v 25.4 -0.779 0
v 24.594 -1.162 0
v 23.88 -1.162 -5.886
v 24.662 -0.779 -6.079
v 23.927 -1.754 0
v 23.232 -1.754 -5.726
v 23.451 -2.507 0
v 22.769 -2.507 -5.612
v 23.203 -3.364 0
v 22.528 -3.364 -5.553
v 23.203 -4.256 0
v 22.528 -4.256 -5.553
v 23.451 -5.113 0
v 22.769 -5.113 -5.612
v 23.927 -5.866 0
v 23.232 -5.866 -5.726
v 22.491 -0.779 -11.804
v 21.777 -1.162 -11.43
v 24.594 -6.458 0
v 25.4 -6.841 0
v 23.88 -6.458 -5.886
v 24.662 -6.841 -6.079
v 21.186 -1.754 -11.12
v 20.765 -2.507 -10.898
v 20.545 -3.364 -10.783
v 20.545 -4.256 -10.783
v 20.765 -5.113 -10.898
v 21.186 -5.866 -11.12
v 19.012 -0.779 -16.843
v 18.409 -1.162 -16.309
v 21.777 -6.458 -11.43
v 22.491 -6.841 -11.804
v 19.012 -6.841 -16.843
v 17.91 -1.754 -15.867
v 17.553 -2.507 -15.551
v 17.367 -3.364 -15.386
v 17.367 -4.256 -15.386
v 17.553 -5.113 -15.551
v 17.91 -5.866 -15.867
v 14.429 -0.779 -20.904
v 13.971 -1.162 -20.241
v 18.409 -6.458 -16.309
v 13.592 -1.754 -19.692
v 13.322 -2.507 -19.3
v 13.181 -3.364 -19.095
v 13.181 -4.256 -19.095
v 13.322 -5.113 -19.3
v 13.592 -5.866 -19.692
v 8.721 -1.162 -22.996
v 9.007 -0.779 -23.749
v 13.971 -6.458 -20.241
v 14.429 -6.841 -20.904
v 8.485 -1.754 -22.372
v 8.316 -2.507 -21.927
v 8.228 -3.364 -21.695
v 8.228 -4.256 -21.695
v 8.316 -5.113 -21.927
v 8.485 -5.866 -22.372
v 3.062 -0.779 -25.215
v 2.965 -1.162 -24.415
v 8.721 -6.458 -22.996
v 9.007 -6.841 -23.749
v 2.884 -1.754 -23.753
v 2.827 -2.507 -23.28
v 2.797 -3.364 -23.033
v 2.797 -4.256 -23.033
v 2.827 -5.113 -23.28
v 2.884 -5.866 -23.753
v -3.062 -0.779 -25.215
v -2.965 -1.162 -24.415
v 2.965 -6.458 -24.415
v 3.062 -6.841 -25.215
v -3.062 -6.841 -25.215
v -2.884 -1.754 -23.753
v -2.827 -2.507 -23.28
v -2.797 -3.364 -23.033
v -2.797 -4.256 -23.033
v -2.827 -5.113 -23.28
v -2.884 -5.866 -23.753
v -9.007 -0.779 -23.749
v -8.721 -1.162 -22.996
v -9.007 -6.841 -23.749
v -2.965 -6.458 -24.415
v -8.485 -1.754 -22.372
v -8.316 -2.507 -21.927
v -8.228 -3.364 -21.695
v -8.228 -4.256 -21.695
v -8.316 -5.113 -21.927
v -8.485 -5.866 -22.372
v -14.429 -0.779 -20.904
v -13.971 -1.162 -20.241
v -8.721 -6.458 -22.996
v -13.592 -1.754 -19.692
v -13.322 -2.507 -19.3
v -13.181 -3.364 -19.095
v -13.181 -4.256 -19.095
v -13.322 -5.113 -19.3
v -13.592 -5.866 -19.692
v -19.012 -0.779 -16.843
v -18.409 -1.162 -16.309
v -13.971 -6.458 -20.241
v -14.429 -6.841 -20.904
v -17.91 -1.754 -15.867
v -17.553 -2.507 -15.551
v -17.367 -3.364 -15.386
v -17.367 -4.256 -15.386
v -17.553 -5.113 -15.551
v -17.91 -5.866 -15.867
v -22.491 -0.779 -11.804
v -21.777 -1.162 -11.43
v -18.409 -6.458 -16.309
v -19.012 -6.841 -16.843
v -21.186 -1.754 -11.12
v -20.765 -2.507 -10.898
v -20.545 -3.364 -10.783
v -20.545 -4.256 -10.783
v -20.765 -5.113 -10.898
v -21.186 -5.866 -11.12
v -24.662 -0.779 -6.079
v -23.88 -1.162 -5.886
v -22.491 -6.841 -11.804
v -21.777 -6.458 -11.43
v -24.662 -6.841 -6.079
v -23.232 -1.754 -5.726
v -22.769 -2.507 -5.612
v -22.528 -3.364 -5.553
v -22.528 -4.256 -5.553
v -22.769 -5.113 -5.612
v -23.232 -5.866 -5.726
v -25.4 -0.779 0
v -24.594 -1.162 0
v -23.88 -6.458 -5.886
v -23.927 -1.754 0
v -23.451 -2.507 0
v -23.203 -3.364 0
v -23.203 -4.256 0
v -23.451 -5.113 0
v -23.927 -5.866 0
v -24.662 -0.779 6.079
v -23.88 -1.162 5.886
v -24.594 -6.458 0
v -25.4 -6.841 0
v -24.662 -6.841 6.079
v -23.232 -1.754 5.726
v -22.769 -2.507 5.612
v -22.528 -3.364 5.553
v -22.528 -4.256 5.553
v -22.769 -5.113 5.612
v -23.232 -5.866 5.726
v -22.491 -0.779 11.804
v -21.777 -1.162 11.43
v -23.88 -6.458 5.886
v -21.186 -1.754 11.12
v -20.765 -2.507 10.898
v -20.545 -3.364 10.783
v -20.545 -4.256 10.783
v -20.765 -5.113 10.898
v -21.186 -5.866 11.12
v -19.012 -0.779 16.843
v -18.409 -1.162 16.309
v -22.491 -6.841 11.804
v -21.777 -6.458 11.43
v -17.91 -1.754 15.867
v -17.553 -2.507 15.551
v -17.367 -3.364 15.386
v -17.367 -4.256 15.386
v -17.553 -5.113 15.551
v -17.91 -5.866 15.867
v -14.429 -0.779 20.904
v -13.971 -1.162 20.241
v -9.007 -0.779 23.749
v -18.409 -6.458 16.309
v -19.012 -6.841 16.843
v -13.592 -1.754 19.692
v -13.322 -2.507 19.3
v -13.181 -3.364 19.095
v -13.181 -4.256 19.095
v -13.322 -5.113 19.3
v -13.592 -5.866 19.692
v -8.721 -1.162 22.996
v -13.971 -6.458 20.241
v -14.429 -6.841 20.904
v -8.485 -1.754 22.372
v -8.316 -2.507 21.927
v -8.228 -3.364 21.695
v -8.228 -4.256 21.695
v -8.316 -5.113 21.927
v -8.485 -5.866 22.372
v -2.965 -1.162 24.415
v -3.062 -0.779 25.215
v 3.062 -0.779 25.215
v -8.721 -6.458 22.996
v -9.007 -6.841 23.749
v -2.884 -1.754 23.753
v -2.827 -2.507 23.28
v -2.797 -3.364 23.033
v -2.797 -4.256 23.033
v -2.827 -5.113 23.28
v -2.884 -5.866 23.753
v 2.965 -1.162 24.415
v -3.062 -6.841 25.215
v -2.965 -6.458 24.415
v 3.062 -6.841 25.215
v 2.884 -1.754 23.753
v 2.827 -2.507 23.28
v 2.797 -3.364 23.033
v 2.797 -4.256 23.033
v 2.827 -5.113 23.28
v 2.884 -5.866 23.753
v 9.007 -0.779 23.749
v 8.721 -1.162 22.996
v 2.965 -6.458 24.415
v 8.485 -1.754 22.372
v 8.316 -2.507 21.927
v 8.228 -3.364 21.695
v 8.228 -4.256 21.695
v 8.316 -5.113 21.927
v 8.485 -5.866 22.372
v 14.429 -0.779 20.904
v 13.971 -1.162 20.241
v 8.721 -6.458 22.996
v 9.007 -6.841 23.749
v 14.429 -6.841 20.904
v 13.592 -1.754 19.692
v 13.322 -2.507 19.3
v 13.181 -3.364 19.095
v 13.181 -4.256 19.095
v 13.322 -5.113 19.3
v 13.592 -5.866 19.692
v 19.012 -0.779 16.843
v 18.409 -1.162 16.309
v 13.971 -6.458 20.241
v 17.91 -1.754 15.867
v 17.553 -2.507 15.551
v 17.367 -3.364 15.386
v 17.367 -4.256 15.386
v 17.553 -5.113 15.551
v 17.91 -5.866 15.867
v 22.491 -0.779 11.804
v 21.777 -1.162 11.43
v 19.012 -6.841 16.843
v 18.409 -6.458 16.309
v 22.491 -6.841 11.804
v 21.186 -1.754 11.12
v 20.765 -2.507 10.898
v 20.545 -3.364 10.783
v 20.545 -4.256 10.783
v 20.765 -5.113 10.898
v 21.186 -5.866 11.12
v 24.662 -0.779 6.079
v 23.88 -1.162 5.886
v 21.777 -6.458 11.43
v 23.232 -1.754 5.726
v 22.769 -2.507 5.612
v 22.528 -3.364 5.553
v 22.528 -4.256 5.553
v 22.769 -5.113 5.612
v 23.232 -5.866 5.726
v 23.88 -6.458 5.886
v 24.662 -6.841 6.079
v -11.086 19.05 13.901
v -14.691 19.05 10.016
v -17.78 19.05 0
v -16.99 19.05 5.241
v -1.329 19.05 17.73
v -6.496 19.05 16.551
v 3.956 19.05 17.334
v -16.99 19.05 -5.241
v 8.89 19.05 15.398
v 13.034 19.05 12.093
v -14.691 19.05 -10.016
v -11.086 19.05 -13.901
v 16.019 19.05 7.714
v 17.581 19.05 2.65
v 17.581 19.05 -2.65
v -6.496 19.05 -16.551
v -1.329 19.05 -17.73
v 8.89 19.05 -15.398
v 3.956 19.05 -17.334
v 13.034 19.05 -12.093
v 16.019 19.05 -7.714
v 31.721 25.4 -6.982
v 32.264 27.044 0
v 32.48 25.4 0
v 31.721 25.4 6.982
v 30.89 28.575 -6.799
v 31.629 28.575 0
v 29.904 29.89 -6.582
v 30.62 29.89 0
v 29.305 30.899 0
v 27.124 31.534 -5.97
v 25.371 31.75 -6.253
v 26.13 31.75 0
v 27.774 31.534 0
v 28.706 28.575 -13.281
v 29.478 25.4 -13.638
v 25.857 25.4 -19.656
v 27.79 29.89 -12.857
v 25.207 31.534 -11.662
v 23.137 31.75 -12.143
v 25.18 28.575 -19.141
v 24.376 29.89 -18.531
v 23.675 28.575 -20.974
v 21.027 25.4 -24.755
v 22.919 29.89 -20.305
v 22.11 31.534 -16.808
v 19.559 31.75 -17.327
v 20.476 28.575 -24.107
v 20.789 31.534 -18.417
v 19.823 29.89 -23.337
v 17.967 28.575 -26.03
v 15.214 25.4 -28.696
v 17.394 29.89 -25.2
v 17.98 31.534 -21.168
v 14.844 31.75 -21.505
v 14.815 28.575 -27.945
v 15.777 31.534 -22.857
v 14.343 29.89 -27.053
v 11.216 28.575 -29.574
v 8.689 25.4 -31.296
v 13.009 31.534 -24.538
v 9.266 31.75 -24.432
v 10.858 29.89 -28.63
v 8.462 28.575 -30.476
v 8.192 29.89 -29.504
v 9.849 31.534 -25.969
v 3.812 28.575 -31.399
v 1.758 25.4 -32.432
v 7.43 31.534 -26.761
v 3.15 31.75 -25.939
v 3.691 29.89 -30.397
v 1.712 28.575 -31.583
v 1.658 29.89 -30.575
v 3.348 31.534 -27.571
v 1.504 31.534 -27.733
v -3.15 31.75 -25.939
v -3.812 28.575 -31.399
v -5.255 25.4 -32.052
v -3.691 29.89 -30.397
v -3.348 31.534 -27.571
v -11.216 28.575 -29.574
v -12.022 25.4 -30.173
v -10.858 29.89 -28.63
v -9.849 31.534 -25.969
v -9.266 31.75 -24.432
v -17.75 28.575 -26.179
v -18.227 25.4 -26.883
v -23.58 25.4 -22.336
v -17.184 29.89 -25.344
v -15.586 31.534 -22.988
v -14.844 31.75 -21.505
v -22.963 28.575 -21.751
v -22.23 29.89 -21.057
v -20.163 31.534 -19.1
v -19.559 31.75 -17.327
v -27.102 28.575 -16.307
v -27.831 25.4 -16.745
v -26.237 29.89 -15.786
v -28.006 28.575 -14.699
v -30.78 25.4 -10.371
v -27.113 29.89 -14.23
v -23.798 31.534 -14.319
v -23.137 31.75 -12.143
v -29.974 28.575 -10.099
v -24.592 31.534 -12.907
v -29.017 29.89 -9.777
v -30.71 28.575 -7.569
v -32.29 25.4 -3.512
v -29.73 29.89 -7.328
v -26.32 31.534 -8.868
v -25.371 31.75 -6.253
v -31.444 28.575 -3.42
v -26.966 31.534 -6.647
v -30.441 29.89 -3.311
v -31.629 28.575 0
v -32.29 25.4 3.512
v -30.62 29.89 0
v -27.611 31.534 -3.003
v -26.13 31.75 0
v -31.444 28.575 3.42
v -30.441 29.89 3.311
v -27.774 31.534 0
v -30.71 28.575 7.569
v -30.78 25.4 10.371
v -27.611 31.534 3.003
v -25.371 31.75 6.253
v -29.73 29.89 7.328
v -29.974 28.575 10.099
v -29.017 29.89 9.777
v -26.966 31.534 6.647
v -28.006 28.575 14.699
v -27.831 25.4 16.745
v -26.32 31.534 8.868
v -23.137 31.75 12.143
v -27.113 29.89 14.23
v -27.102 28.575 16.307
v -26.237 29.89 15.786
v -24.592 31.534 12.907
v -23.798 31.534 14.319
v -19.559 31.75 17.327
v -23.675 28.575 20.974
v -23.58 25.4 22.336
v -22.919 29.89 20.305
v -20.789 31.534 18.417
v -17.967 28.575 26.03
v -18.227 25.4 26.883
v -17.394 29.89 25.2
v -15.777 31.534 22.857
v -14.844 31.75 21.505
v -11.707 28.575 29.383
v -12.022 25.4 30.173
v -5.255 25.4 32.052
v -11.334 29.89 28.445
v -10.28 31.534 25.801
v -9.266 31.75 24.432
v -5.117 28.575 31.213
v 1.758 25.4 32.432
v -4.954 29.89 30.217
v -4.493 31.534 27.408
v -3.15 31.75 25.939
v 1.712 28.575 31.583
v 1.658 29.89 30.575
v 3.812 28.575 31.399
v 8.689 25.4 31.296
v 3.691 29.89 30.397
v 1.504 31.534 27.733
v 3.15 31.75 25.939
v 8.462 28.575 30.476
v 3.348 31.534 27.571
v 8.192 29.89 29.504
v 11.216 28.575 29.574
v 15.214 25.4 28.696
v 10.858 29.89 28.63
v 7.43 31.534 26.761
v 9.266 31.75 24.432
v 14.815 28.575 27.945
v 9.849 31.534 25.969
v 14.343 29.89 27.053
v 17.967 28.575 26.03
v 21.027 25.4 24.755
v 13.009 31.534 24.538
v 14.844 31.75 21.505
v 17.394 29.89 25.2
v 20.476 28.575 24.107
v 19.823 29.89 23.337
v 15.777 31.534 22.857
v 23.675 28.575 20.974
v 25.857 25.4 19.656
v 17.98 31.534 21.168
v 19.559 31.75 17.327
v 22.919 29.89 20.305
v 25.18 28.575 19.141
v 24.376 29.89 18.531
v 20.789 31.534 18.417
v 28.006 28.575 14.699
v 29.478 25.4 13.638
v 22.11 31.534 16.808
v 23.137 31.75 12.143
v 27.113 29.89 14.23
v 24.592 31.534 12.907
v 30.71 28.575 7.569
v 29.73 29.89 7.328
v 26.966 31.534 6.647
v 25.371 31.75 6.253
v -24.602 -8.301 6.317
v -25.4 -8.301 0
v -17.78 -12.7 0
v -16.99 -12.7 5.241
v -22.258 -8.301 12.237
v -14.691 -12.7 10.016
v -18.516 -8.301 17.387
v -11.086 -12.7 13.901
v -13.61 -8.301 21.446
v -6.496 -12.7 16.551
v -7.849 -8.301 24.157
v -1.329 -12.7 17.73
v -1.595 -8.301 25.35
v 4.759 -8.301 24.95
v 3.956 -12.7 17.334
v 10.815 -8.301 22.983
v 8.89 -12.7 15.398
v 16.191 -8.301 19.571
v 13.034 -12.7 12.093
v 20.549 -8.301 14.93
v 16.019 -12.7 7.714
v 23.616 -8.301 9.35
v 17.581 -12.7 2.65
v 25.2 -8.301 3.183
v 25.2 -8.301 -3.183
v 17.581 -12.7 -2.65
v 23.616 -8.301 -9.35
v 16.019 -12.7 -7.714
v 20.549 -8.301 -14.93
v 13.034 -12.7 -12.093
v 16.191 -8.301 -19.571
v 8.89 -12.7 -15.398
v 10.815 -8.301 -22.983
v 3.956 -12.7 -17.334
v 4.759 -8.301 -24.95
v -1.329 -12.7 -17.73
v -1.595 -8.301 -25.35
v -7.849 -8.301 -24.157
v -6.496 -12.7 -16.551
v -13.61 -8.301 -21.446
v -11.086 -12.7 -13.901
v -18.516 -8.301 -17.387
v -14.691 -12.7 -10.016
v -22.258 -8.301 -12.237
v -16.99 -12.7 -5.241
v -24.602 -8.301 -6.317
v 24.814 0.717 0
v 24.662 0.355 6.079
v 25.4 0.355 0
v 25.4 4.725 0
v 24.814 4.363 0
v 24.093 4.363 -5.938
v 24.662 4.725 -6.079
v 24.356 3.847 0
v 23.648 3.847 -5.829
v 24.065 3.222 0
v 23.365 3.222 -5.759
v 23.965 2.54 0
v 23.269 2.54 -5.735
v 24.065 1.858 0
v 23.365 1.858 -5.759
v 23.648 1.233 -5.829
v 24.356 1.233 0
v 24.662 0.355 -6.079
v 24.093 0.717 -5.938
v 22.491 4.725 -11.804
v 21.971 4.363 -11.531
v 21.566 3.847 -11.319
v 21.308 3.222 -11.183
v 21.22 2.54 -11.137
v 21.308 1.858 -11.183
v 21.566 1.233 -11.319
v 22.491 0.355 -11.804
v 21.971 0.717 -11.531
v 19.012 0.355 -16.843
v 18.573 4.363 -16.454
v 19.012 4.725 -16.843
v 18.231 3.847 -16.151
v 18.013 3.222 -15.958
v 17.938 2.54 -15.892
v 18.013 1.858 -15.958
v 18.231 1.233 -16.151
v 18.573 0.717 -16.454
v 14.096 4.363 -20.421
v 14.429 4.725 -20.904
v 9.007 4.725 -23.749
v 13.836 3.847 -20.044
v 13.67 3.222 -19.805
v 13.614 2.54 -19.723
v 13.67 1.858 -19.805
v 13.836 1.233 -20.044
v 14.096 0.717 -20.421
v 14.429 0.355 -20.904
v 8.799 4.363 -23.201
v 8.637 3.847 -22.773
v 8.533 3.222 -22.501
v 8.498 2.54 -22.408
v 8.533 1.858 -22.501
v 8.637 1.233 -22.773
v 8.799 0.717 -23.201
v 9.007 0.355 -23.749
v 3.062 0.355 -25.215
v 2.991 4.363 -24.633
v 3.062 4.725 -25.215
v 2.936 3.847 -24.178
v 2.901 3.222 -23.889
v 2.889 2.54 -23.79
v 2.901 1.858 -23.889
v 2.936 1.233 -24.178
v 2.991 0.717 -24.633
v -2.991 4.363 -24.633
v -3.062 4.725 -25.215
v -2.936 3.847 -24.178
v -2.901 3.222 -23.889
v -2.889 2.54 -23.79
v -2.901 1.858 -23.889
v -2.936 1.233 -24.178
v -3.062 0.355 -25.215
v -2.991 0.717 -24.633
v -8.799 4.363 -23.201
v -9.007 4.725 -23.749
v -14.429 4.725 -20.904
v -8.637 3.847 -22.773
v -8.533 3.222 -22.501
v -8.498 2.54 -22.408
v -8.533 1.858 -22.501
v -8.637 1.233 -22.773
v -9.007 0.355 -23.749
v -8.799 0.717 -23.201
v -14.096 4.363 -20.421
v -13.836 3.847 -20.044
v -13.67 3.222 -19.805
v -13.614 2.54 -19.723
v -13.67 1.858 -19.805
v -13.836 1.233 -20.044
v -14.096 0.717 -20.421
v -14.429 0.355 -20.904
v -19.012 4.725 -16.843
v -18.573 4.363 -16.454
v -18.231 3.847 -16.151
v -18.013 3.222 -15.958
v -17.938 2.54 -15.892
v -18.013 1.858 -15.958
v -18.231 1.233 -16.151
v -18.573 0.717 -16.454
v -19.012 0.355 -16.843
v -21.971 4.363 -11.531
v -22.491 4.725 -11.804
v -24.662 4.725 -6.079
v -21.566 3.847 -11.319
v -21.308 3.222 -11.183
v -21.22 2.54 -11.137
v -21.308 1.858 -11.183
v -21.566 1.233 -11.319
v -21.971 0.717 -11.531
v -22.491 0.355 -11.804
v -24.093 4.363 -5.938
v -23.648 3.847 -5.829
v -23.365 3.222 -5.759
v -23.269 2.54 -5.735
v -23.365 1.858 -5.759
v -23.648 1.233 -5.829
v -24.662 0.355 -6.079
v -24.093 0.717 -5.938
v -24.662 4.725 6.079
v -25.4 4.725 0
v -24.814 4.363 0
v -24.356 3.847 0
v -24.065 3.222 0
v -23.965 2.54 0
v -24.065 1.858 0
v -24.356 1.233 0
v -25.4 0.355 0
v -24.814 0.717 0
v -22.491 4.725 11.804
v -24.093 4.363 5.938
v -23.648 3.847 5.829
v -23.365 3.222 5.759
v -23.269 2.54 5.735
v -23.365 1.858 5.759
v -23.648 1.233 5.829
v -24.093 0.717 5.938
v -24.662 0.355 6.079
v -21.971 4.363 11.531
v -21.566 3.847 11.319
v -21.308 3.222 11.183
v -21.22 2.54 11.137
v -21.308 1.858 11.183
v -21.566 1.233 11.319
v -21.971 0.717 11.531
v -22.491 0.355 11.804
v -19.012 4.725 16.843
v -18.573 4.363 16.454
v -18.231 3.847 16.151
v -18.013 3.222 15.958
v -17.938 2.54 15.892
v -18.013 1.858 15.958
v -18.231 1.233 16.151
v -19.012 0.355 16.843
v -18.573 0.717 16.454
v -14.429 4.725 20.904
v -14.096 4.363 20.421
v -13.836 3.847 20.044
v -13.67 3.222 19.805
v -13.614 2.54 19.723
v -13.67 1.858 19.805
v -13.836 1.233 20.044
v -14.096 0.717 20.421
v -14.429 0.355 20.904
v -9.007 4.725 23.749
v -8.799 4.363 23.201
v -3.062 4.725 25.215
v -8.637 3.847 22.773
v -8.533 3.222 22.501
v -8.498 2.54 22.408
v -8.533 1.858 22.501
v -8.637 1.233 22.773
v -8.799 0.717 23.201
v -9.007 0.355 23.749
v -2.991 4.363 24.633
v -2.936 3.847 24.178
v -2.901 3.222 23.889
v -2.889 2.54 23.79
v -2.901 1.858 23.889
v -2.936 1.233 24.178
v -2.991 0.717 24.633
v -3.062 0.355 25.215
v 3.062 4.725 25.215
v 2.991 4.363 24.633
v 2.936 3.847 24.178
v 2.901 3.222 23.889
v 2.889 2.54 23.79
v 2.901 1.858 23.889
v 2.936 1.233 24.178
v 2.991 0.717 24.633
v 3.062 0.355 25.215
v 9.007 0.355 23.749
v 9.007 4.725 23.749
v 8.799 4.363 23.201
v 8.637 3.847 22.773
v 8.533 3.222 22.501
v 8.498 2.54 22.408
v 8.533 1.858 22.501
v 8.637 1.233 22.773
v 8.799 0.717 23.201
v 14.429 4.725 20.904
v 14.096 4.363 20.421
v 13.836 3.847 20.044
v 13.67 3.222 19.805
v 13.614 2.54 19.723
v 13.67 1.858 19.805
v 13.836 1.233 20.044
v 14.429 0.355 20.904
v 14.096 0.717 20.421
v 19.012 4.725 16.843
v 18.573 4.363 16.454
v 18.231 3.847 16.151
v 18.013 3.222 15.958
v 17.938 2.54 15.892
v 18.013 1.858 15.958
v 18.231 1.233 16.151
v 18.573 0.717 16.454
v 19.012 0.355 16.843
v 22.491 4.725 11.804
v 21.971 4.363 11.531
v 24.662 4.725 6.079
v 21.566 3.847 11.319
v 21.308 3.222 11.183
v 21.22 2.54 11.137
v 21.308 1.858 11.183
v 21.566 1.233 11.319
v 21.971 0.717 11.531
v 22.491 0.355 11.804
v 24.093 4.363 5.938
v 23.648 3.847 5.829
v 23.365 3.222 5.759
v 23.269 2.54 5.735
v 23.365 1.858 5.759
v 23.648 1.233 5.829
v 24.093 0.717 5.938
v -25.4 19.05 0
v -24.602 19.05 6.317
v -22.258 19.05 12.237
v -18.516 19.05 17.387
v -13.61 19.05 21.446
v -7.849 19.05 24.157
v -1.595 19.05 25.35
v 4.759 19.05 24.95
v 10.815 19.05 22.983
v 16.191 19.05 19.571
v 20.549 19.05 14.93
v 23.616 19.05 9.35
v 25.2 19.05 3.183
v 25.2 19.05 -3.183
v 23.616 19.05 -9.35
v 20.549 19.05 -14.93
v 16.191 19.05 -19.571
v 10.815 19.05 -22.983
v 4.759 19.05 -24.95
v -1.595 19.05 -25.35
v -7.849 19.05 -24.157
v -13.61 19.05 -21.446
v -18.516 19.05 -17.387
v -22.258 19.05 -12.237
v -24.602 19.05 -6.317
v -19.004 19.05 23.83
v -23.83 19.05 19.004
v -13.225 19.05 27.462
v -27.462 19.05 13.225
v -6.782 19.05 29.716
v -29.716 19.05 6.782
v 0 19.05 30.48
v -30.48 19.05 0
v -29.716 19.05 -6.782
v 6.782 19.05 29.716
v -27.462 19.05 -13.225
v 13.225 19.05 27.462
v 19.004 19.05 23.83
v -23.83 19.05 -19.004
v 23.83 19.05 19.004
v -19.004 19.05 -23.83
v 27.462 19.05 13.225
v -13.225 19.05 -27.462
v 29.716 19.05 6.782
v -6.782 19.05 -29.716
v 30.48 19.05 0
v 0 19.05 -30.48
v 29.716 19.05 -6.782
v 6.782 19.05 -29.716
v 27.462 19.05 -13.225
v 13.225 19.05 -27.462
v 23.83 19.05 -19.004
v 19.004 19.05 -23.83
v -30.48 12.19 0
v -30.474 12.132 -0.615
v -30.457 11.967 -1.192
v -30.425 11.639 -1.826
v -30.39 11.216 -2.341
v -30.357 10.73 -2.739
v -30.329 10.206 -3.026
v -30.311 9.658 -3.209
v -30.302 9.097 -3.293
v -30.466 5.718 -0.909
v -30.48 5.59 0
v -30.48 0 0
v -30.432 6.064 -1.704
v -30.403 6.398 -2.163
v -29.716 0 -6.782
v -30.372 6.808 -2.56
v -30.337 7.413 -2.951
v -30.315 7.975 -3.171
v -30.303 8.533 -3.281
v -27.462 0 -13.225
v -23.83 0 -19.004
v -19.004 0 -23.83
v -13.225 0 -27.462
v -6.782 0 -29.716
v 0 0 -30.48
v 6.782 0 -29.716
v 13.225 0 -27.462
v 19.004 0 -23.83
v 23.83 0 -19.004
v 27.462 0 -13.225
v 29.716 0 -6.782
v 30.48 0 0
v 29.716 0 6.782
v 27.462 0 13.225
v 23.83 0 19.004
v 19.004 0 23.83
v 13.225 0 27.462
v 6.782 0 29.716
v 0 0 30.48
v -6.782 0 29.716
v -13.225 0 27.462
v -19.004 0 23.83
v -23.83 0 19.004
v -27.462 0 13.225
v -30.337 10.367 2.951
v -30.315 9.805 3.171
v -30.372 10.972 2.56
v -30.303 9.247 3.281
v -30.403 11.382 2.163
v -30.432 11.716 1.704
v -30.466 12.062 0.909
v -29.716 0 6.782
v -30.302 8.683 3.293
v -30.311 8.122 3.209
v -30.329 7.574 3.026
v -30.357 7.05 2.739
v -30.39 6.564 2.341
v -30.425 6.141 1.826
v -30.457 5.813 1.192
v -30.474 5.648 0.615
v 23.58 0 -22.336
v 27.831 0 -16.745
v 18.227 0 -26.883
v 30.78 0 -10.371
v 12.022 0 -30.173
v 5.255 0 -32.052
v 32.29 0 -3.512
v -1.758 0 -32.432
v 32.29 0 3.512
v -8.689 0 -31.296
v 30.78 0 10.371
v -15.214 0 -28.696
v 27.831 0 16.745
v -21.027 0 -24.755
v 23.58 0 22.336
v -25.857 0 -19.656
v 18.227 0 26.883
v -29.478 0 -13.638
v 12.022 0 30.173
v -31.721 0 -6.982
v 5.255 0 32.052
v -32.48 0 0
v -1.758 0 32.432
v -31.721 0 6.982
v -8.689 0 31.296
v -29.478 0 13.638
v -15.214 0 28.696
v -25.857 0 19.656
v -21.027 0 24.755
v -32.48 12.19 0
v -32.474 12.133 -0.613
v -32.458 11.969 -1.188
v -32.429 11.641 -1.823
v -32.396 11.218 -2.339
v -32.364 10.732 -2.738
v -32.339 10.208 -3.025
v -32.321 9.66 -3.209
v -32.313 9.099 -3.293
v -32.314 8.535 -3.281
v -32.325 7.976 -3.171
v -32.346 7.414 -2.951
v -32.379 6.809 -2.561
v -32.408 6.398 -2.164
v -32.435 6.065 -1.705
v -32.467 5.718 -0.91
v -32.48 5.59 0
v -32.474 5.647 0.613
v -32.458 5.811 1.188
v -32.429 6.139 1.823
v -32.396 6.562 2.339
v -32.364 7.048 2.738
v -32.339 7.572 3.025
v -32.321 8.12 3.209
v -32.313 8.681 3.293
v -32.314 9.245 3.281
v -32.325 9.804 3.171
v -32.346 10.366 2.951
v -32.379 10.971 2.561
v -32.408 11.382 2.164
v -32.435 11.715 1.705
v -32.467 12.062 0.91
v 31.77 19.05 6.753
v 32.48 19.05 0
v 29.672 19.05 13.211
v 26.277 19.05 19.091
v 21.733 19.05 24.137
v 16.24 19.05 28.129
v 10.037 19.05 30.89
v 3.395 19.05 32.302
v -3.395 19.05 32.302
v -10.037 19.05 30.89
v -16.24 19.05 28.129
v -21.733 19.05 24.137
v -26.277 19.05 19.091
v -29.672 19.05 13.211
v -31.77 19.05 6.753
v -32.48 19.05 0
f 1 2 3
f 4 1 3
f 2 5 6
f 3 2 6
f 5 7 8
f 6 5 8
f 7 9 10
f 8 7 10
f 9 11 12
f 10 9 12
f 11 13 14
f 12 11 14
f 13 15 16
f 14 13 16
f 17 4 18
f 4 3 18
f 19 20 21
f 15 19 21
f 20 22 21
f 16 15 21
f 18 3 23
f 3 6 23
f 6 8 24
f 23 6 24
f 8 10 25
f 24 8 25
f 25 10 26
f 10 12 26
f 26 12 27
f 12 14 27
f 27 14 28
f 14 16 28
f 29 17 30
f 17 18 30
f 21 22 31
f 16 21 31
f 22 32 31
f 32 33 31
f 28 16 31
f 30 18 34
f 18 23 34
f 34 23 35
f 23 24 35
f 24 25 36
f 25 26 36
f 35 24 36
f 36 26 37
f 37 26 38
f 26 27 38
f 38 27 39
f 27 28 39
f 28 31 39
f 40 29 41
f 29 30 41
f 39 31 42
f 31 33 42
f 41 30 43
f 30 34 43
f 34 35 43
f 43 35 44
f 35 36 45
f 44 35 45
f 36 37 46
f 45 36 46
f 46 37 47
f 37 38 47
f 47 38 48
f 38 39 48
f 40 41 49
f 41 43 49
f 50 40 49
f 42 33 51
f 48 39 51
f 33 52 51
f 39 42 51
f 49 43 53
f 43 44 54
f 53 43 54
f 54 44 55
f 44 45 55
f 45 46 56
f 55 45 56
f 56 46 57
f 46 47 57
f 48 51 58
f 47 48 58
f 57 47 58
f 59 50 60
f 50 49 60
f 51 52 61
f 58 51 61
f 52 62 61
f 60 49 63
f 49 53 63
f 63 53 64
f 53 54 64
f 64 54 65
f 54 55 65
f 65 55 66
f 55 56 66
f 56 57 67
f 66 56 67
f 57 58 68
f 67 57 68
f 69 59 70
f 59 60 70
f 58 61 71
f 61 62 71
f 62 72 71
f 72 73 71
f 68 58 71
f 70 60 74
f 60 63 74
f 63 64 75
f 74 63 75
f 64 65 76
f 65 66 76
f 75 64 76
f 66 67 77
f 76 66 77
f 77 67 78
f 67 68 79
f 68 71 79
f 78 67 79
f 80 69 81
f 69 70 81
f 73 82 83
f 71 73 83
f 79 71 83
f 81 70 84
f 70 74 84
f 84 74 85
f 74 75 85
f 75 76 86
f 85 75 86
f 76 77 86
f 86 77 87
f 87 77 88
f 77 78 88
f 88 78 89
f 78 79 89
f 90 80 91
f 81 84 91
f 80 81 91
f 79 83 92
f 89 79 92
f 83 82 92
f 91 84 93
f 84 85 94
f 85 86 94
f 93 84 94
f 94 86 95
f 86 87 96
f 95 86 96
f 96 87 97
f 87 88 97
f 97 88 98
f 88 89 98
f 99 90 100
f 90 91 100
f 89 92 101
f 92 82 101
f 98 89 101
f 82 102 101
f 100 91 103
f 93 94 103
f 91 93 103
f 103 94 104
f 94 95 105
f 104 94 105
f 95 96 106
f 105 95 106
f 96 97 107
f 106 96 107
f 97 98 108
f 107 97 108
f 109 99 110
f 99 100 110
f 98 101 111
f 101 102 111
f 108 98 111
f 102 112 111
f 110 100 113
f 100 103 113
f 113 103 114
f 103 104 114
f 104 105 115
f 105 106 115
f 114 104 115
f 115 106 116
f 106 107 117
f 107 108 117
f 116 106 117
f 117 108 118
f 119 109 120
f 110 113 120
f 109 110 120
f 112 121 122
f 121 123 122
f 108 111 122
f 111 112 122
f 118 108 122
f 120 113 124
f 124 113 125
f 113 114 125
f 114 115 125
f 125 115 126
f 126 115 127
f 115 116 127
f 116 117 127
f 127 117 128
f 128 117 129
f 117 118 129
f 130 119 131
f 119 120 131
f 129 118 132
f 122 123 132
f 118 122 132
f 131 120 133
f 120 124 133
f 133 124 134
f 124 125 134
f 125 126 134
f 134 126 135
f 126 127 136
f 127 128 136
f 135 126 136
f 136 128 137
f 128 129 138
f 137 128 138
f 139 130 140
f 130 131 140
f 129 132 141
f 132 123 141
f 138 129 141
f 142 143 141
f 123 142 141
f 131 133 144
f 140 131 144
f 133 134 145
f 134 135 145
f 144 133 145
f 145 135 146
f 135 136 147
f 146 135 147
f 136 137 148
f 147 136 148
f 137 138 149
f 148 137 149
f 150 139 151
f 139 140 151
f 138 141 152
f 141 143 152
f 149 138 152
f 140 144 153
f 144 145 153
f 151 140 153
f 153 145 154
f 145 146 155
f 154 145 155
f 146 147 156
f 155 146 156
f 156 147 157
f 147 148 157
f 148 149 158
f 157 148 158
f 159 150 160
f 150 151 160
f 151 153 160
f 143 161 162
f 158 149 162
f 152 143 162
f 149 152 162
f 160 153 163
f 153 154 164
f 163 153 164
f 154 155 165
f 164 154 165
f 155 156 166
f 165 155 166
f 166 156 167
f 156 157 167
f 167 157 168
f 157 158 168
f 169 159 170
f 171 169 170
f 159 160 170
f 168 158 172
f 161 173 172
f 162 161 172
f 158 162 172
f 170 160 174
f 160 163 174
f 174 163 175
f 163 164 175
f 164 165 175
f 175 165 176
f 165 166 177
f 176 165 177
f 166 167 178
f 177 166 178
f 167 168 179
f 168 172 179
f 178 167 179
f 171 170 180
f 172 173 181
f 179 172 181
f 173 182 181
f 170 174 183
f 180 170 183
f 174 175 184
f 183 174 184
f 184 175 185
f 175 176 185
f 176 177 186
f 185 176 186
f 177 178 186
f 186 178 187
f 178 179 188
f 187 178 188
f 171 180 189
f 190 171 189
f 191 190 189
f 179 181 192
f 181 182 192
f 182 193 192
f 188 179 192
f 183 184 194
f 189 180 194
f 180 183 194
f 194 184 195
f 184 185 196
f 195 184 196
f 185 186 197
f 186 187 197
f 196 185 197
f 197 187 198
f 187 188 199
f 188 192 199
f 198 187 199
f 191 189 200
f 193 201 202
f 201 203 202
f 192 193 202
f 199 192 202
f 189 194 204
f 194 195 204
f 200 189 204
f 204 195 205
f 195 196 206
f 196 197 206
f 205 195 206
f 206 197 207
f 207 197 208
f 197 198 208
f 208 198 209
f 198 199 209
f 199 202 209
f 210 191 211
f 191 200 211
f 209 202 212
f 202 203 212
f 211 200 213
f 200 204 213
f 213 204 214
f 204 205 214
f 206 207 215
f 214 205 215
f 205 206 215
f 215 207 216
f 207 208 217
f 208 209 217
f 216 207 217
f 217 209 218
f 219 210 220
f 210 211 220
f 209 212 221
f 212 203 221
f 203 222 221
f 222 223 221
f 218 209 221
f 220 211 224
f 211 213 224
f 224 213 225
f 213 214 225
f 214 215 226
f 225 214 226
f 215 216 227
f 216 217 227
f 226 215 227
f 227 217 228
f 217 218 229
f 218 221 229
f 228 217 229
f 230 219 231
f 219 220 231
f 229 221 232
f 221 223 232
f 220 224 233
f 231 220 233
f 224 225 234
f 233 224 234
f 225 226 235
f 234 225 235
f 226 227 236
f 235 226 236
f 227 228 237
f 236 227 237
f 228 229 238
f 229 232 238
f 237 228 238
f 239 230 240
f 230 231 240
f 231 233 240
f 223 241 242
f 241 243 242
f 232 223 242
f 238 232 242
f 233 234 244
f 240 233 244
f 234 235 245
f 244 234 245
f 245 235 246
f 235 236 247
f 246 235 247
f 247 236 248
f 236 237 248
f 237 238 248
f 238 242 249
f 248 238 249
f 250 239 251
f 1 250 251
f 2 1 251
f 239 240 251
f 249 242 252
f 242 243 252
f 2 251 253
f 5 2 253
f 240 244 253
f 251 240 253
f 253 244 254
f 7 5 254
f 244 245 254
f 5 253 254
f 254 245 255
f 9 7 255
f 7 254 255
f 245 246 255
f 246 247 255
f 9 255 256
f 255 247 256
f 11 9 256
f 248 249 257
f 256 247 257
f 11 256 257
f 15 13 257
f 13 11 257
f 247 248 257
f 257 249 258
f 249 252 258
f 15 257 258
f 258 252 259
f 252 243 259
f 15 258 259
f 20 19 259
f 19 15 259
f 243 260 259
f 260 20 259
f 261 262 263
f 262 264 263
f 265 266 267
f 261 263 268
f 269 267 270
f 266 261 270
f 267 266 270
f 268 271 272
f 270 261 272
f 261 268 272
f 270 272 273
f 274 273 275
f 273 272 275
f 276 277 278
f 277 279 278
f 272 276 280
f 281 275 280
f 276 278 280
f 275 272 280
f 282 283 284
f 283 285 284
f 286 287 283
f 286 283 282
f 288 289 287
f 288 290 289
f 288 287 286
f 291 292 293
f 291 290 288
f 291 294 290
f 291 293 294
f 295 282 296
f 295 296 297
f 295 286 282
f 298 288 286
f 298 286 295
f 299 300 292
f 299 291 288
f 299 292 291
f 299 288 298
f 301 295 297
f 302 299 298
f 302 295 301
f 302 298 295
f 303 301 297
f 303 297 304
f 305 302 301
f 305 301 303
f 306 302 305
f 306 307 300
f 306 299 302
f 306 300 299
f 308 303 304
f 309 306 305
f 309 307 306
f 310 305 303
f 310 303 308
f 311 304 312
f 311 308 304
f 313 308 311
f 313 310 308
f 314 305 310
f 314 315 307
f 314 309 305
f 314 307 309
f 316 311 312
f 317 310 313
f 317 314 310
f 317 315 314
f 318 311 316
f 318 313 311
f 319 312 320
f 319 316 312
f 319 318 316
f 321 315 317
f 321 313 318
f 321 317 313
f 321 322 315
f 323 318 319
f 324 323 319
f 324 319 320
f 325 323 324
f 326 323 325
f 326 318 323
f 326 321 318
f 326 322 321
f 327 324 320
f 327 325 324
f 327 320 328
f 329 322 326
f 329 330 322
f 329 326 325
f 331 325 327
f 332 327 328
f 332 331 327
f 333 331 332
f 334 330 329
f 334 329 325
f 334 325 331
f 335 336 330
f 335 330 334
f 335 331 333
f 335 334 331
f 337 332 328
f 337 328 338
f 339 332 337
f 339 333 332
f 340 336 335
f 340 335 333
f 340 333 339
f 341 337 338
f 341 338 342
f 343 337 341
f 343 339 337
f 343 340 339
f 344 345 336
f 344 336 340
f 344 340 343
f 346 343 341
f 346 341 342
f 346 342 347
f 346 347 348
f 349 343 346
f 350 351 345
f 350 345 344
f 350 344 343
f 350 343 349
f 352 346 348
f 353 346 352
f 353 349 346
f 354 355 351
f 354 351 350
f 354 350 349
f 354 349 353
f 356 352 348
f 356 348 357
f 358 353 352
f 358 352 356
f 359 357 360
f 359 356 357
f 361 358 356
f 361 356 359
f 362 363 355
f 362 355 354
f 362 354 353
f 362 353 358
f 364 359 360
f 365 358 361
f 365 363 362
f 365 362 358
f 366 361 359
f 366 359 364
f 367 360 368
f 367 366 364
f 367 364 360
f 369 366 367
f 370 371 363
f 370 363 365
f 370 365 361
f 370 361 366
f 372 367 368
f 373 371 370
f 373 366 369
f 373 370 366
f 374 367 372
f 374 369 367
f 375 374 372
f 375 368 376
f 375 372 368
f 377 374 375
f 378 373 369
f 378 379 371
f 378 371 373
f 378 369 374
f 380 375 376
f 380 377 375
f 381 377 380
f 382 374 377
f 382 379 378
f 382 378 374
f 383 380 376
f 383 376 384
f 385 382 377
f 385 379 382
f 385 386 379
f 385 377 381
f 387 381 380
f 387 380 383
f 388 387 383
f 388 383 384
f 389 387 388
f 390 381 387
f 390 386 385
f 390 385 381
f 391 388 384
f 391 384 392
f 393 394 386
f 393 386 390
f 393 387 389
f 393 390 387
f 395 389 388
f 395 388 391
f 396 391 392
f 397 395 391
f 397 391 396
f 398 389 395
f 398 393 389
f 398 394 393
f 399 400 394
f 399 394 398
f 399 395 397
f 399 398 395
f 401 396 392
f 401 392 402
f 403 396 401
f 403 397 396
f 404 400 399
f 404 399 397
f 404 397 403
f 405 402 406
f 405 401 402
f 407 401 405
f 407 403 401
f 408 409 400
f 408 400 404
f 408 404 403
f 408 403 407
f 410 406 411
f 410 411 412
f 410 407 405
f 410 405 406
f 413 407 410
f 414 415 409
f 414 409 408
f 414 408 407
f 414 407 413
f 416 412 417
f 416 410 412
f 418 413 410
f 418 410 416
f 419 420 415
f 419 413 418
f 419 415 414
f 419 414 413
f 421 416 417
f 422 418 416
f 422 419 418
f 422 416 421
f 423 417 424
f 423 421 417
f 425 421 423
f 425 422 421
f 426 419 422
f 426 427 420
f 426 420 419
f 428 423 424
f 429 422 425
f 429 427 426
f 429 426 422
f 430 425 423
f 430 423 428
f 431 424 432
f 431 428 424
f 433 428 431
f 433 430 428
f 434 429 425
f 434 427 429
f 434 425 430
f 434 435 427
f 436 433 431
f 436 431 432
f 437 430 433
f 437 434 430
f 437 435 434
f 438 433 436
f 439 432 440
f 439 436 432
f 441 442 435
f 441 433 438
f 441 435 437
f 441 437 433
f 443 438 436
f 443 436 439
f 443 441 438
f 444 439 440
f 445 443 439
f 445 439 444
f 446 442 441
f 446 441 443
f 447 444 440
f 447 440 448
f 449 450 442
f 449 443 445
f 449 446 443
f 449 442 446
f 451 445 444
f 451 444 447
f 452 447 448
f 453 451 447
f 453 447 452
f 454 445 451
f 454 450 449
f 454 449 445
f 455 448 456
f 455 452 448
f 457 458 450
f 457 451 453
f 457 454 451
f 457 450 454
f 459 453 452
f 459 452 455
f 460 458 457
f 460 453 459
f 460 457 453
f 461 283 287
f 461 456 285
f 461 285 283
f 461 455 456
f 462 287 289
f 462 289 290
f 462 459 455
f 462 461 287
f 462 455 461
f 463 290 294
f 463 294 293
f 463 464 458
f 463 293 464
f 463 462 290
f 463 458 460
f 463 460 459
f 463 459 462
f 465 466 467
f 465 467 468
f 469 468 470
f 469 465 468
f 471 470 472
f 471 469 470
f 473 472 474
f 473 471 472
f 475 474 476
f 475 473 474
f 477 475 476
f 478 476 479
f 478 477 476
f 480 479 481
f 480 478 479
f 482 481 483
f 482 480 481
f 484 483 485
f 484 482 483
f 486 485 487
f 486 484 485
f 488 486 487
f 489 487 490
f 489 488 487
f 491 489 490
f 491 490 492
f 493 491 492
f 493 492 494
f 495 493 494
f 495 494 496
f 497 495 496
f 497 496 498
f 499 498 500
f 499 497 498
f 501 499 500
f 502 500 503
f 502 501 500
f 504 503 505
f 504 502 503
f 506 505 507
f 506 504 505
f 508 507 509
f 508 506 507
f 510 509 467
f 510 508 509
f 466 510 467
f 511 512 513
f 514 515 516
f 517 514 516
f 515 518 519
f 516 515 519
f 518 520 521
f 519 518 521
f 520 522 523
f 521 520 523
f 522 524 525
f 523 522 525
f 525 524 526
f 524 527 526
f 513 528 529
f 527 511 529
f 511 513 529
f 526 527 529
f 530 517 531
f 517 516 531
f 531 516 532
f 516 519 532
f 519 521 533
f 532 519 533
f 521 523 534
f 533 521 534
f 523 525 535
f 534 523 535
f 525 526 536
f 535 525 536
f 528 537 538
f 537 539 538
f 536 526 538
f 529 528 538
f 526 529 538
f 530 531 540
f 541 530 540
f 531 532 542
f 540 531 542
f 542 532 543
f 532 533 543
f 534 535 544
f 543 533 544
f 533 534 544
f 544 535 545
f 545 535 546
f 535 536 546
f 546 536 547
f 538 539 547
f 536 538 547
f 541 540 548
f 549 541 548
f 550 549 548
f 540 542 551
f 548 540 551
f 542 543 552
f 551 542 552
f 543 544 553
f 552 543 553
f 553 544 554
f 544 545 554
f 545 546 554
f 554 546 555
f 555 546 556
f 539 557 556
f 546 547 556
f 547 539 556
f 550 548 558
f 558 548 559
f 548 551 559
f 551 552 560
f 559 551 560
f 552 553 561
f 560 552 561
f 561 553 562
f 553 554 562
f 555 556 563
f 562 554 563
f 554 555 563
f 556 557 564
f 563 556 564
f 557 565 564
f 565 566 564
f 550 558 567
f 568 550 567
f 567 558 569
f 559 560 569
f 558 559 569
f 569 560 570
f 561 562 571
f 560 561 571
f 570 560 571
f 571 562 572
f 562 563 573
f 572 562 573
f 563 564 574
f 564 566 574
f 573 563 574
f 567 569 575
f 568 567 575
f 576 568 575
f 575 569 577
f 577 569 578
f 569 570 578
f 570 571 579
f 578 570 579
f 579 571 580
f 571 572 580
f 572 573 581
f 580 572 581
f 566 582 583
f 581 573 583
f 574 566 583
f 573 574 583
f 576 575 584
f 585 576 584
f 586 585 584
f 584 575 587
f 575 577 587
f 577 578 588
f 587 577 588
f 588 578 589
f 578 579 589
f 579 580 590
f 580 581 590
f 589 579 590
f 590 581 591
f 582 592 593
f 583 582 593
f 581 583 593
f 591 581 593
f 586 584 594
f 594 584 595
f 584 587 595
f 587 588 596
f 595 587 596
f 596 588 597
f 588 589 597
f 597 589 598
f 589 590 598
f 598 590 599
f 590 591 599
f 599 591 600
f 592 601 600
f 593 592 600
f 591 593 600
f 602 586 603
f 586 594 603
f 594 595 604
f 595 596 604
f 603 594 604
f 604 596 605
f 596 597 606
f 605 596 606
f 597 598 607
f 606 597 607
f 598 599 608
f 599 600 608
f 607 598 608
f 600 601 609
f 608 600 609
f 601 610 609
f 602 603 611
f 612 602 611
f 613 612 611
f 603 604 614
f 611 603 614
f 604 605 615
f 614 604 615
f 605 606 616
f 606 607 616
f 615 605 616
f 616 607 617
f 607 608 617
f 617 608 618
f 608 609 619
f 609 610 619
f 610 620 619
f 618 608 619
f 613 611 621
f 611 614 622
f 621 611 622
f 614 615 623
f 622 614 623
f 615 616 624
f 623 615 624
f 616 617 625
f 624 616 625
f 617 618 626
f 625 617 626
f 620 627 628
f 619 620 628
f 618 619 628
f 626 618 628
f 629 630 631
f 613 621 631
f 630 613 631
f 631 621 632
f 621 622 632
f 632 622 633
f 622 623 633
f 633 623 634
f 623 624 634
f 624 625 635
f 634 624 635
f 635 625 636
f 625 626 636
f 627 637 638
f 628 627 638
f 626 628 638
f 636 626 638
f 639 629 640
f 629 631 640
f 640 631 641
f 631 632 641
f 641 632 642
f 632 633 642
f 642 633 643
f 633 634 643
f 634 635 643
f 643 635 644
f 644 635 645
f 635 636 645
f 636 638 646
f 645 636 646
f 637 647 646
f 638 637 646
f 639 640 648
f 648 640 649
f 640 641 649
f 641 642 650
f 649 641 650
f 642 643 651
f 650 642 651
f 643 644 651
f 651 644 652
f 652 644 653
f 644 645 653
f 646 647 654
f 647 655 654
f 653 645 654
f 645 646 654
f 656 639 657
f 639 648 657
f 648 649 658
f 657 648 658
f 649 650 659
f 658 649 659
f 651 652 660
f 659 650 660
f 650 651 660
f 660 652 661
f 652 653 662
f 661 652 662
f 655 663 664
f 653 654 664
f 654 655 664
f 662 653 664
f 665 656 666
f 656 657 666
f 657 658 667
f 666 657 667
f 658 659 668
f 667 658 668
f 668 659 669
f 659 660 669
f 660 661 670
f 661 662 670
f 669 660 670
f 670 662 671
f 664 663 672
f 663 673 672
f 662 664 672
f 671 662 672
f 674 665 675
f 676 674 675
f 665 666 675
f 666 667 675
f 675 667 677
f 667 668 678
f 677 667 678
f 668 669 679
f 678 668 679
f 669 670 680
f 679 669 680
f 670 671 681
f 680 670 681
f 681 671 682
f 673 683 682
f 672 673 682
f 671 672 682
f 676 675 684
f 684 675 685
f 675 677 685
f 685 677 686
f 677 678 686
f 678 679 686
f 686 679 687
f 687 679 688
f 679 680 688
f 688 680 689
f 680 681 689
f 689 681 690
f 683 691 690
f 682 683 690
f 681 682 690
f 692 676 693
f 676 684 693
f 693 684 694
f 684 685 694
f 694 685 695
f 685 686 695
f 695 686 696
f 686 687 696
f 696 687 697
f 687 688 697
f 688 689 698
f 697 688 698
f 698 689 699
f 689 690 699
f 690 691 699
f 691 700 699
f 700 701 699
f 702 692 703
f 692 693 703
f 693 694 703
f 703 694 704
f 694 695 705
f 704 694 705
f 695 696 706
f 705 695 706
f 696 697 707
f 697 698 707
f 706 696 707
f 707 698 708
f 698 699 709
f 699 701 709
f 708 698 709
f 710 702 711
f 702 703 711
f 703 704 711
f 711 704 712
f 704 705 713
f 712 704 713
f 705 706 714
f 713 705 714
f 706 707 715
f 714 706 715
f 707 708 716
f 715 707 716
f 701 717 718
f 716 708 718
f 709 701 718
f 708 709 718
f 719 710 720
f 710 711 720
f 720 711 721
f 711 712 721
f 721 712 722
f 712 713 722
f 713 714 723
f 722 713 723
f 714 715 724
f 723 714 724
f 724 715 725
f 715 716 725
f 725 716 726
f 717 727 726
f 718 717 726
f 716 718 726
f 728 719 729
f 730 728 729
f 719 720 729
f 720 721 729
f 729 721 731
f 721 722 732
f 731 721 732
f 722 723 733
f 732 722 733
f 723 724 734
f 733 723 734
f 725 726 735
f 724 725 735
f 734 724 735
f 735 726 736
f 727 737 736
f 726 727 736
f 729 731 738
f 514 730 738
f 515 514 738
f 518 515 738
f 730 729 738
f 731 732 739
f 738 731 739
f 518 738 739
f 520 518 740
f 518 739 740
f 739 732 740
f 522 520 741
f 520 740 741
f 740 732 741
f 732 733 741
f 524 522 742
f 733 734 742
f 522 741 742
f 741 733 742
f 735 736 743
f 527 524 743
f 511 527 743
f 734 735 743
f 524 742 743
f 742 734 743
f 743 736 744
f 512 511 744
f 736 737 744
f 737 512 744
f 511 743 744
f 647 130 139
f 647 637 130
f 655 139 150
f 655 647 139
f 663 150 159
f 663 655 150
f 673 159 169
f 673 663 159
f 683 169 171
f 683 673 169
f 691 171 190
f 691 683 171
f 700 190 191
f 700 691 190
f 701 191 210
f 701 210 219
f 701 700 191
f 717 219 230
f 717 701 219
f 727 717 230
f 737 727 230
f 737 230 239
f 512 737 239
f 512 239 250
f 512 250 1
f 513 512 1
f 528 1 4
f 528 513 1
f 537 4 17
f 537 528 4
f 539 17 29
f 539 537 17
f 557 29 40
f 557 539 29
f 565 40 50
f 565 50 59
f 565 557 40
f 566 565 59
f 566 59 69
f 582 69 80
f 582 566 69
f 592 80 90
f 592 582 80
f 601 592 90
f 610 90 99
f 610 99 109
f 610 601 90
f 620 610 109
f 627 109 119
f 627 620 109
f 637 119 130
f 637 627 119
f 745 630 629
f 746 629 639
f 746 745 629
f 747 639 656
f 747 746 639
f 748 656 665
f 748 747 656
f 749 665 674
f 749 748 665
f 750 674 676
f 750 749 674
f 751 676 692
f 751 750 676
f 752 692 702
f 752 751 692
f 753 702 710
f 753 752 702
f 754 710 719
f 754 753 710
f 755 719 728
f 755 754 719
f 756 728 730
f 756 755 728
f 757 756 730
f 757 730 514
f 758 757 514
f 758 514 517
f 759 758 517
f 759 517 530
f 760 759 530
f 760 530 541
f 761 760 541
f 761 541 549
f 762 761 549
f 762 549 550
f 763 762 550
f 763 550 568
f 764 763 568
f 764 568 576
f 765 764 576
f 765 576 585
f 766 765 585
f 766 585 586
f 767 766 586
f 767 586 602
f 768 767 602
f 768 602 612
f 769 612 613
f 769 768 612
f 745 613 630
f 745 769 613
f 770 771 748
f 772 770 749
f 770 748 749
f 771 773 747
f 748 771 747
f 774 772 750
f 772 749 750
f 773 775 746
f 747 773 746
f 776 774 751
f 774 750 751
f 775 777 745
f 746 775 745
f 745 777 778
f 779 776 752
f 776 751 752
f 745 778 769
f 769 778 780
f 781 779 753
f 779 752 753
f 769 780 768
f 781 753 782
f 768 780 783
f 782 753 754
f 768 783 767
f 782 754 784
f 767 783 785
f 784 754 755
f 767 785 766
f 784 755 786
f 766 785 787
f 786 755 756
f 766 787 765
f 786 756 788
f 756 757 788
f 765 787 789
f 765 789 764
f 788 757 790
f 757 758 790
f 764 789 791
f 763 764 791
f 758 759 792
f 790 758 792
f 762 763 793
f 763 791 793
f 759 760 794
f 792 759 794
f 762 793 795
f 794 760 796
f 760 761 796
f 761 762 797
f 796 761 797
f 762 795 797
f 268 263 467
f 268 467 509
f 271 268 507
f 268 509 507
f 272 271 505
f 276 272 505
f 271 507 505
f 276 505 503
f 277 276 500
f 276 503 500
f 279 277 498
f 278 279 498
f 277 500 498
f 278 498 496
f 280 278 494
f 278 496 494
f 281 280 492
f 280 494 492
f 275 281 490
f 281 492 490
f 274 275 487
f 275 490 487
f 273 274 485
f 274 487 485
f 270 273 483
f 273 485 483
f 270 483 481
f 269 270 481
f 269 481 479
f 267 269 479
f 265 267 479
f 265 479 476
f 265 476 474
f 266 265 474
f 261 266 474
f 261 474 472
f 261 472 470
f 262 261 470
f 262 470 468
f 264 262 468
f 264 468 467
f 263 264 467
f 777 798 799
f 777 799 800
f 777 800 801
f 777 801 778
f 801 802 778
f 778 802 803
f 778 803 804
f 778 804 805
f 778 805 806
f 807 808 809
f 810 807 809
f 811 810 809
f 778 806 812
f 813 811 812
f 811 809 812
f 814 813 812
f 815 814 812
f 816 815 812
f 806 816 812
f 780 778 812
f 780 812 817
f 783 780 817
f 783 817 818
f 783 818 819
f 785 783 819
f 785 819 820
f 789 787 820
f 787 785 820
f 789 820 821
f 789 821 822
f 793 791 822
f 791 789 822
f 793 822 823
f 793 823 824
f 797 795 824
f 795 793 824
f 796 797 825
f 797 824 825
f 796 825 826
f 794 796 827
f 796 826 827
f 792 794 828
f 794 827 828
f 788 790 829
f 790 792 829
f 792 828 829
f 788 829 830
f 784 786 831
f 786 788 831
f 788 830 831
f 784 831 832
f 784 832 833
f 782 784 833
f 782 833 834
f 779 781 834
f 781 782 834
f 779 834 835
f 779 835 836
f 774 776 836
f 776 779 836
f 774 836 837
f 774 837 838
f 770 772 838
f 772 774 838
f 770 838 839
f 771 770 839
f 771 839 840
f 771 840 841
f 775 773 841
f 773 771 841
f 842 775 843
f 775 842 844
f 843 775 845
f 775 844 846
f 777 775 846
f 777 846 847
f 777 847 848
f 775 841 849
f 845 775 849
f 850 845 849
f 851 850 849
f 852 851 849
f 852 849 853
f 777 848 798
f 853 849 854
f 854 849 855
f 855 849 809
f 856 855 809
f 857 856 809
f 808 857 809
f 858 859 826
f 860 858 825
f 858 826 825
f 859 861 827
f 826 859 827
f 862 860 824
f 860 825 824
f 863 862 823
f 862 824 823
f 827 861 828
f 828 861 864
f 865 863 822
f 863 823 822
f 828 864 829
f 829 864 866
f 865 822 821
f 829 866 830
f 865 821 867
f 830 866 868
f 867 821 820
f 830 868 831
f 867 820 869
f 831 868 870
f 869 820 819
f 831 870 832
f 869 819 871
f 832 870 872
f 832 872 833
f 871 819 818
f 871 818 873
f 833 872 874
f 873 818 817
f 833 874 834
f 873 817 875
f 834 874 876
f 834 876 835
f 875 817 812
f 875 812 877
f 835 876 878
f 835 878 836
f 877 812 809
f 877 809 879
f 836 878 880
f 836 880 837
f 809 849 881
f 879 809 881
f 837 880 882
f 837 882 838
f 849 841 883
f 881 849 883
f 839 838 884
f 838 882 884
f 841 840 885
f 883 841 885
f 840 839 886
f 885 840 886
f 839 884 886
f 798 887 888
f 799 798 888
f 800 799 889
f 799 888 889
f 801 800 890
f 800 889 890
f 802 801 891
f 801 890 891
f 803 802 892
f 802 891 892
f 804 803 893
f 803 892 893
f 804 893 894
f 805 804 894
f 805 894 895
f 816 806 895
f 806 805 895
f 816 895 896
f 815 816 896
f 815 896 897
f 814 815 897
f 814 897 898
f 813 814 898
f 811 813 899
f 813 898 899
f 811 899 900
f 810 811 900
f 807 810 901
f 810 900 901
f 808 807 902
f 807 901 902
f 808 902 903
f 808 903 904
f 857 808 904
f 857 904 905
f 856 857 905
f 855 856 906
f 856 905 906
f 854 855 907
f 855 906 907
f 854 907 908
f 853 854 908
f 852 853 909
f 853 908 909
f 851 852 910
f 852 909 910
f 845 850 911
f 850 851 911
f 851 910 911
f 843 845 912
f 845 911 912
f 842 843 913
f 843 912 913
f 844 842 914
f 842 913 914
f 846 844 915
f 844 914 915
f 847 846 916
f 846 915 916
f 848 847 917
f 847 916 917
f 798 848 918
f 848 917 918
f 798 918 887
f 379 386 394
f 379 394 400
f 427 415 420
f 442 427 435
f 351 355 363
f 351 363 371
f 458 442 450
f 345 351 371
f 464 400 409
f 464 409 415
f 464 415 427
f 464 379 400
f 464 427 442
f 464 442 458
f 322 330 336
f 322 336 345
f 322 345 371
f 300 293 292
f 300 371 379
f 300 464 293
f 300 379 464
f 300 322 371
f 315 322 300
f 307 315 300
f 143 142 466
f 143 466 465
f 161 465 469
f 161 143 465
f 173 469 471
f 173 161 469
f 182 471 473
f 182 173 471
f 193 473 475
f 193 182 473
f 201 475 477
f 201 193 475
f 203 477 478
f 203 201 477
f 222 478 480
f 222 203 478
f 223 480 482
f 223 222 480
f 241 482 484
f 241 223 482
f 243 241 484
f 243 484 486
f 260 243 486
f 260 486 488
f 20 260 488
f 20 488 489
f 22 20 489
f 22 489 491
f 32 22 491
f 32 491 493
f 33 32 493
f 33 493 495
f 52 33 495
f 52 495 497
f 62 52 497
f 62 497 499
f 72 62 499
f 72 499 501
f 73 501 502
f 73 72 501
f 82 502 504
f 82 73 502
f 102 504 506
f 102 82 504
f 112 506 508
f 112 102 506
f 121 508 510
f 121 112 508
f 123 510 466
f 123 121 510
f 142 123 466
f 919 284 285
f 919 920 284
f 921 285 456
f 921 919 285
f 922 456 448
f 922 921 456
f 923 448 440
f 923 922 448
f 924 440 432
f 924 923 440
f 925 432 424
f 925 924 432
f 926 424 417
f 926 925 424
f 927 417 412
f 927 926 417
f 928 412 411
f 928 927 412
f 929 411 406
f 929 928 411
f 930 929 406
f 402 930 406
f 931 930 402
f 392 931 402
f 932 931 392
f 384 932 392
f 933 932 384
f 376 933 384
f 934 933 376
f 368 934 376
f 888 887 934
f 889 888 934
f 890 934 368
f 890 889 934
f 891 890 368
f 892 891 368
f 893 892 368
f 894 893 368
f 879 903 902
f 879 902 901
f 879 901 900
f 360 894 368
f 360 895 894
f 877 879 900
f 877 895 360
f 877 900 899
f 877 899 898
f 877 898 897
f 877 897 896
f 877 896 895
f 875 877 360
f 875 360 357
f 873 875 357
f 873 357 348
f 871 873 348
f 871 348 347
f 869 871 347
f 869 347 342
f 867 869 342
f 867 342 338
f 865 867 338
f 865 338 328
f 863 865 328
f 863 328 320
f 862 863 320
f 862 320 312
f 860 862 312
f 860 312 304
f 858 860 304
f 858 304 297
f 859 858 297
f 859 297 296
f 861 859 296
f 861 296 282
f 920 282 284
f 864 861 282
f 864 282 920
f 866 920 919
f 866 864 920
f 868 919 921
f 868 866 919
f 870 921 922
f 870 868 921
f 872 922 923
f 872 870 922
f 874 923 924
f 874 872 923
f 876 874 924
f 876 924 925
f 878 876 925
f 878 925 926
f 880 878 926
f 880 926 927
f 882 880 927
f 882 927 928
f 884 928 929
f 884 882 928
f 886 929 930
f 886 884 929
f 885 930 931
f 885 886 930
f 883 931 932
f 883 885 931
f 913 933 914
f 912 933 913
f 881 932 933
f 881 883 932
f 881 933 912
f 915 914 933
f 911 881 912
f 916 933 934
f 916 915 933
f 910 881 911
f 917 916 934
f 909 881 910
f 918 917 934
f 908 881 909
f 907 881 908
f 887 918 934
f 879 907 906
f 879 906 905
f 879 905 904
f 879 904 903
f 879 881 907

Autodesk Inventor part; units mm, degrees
ref_plane "XZ Plane" through (0, 0, 0) normal (0, 1, 0) x (-1, 0, 0)
sketch "Sketch1" plane through (0, 0, 0) normal (0, 1, 0) x (-1, 0, 0)
  circle A0 centre (0, 0) radius 30.48
  circle A1 centre (0, 0) radius 32.48
  dimension "d0" = 60.96
  dimension "d2" = 2
extrude "Extrusion1" add sketch "Sketch1" along normal blind 19.05
sketch "Sketch2" plane through (0, 19.05, 0) normal (0, 1, 0) x (1, 0, 0)
  circle A0 centre (0, 0) radius 32.48
  circle A1 centre (0, 0) radius 32.48 projected
extrude "Extrusion2" add sketch "Sketch2" along normal blind 12.7
fillet "Fillet1" radius 6.35 1 edges at (-32.48, 31.75, 0)
sketch "Sketch10" plane through (0, 0, 0) normal (0, 0, 1) x (1, 0, 0)
  line L0 (-17.78, 19.05) -> (-17.78, -12.7)
  line L1 (-17.78, -12.7) -> (-25.4, -12.7)
  line L2 (-25.4, -12.7) -> (-25.4, 19.05)
  line L3 (-17.78, 19.05) -> (-25.4, 19.05)
  line L4 (-26.13, 31.75) -> (26.13, 31.75) projected
  line L5 (0, 31.75) -> (0, 0)
  line L6 (32.48, 0) -> (-32.48, 0) projected
  line L7 (-30.48, 0) -> (-30.48, 19.05)
  line L8 (-17.78, -12.7) -> (-25.4, -8.3006)
  line L9 (-30.48, 19.05) -> (30.48, 19.05) projected
  point P0 (-30.48, 0)
  point P1 (-25.4, 19.05)
  dimension "d29" = 7.62
  dimension "d33" = 30
  dimension "d42" = 25.4
  dimension "d89" = 31.75
revolve "Revolution2" add sketch "Sketch10" angle 360 about axis through (0, 31.75, 0) along (0, -1, 0) contours L0 L6 L2 L3 | L0 L8 L2 L6
sketch "Sketch11" plane through (0, 0, 0) normal (0, 0, 1) x (1, 0, 0)
  line L0 (25.4, -7.0306) -> (25.4, 25.4)
  circle A0 centre (26.3462, -3.81) radius 3.175
  circle A1 centre (26.3462, 2.54) radius 2.3813
  line L1 (0, -11.43) -> (0, 31.75)
  line L2 (-26.13, 31.75) -> (26.13, 31.75) projected
  line L3 (26.3462, 2.54) -> (26.3462, -3.81)
  line L4 (30.48, 19.05) -> (30.48, 0) projected
  line L5 (30.48, 0) -> (29.972, 19.05)
  line L6 (29.972, 19.05) -> (29.972, 0) projected
  line L7 (-25.4, -5.08) -> (25.4, -5.08) projected
  line L8 (-17.78, -12.7) -> (17.78, -12.7) projected
  point P0 (0, 0)
  point P1 (25.4, -8.3006)
  point P2 (27.772, -0.6806)
  point P3 (17.78, -12.7)
  dimension "d36" = 6.35
  dimension "d37" = 4.7625
  dimension "d38" = 6.35
  dimension "d43" = 26.3462
  dimension "d91" = 8.89
revolve "Revolution3" cut sketch "Sketch11" angle 360 about axis through (0, -11.43, 0) along (0, 1, 0) contours A0 L7 L0 | L0 A0 | L7 A0 L0 | A1 L0 | L0 A1
ref_plane "Work Plane4" through (-32.48, 0, 0) normal (1, 0, 0) x (0, 1, 0)
sketch "Sketch24" plane through (-32.48, 0, 0) normal (1, 0, 0) x (0, 1, 0)
  circle A0 centre (8.89, 0) radius 3.3
  line L0 (0, -32.48) -> (0, 32.48) projected
  line L1 (31.75, 5) -> (31.75, -5) projected
  line L2 (31.75, 0) -> (0, 0) construction
  line L3 (-0.7793, -25.4) -> (-0.7793, 25.4) projected
  dimension "d106" = 6.6
  dimension "d107" = 8.89
  dimension "d108" = 0
extrude "Extrusion16" cut sketch "Sketch24" along normal up to surface
ref_plane "Work Plane5" through (30.48, 0, 0) normal (1, 0, 0) x (0, 1, 0)
properties part number "Water_Sensor_Cap_3DPrint"
